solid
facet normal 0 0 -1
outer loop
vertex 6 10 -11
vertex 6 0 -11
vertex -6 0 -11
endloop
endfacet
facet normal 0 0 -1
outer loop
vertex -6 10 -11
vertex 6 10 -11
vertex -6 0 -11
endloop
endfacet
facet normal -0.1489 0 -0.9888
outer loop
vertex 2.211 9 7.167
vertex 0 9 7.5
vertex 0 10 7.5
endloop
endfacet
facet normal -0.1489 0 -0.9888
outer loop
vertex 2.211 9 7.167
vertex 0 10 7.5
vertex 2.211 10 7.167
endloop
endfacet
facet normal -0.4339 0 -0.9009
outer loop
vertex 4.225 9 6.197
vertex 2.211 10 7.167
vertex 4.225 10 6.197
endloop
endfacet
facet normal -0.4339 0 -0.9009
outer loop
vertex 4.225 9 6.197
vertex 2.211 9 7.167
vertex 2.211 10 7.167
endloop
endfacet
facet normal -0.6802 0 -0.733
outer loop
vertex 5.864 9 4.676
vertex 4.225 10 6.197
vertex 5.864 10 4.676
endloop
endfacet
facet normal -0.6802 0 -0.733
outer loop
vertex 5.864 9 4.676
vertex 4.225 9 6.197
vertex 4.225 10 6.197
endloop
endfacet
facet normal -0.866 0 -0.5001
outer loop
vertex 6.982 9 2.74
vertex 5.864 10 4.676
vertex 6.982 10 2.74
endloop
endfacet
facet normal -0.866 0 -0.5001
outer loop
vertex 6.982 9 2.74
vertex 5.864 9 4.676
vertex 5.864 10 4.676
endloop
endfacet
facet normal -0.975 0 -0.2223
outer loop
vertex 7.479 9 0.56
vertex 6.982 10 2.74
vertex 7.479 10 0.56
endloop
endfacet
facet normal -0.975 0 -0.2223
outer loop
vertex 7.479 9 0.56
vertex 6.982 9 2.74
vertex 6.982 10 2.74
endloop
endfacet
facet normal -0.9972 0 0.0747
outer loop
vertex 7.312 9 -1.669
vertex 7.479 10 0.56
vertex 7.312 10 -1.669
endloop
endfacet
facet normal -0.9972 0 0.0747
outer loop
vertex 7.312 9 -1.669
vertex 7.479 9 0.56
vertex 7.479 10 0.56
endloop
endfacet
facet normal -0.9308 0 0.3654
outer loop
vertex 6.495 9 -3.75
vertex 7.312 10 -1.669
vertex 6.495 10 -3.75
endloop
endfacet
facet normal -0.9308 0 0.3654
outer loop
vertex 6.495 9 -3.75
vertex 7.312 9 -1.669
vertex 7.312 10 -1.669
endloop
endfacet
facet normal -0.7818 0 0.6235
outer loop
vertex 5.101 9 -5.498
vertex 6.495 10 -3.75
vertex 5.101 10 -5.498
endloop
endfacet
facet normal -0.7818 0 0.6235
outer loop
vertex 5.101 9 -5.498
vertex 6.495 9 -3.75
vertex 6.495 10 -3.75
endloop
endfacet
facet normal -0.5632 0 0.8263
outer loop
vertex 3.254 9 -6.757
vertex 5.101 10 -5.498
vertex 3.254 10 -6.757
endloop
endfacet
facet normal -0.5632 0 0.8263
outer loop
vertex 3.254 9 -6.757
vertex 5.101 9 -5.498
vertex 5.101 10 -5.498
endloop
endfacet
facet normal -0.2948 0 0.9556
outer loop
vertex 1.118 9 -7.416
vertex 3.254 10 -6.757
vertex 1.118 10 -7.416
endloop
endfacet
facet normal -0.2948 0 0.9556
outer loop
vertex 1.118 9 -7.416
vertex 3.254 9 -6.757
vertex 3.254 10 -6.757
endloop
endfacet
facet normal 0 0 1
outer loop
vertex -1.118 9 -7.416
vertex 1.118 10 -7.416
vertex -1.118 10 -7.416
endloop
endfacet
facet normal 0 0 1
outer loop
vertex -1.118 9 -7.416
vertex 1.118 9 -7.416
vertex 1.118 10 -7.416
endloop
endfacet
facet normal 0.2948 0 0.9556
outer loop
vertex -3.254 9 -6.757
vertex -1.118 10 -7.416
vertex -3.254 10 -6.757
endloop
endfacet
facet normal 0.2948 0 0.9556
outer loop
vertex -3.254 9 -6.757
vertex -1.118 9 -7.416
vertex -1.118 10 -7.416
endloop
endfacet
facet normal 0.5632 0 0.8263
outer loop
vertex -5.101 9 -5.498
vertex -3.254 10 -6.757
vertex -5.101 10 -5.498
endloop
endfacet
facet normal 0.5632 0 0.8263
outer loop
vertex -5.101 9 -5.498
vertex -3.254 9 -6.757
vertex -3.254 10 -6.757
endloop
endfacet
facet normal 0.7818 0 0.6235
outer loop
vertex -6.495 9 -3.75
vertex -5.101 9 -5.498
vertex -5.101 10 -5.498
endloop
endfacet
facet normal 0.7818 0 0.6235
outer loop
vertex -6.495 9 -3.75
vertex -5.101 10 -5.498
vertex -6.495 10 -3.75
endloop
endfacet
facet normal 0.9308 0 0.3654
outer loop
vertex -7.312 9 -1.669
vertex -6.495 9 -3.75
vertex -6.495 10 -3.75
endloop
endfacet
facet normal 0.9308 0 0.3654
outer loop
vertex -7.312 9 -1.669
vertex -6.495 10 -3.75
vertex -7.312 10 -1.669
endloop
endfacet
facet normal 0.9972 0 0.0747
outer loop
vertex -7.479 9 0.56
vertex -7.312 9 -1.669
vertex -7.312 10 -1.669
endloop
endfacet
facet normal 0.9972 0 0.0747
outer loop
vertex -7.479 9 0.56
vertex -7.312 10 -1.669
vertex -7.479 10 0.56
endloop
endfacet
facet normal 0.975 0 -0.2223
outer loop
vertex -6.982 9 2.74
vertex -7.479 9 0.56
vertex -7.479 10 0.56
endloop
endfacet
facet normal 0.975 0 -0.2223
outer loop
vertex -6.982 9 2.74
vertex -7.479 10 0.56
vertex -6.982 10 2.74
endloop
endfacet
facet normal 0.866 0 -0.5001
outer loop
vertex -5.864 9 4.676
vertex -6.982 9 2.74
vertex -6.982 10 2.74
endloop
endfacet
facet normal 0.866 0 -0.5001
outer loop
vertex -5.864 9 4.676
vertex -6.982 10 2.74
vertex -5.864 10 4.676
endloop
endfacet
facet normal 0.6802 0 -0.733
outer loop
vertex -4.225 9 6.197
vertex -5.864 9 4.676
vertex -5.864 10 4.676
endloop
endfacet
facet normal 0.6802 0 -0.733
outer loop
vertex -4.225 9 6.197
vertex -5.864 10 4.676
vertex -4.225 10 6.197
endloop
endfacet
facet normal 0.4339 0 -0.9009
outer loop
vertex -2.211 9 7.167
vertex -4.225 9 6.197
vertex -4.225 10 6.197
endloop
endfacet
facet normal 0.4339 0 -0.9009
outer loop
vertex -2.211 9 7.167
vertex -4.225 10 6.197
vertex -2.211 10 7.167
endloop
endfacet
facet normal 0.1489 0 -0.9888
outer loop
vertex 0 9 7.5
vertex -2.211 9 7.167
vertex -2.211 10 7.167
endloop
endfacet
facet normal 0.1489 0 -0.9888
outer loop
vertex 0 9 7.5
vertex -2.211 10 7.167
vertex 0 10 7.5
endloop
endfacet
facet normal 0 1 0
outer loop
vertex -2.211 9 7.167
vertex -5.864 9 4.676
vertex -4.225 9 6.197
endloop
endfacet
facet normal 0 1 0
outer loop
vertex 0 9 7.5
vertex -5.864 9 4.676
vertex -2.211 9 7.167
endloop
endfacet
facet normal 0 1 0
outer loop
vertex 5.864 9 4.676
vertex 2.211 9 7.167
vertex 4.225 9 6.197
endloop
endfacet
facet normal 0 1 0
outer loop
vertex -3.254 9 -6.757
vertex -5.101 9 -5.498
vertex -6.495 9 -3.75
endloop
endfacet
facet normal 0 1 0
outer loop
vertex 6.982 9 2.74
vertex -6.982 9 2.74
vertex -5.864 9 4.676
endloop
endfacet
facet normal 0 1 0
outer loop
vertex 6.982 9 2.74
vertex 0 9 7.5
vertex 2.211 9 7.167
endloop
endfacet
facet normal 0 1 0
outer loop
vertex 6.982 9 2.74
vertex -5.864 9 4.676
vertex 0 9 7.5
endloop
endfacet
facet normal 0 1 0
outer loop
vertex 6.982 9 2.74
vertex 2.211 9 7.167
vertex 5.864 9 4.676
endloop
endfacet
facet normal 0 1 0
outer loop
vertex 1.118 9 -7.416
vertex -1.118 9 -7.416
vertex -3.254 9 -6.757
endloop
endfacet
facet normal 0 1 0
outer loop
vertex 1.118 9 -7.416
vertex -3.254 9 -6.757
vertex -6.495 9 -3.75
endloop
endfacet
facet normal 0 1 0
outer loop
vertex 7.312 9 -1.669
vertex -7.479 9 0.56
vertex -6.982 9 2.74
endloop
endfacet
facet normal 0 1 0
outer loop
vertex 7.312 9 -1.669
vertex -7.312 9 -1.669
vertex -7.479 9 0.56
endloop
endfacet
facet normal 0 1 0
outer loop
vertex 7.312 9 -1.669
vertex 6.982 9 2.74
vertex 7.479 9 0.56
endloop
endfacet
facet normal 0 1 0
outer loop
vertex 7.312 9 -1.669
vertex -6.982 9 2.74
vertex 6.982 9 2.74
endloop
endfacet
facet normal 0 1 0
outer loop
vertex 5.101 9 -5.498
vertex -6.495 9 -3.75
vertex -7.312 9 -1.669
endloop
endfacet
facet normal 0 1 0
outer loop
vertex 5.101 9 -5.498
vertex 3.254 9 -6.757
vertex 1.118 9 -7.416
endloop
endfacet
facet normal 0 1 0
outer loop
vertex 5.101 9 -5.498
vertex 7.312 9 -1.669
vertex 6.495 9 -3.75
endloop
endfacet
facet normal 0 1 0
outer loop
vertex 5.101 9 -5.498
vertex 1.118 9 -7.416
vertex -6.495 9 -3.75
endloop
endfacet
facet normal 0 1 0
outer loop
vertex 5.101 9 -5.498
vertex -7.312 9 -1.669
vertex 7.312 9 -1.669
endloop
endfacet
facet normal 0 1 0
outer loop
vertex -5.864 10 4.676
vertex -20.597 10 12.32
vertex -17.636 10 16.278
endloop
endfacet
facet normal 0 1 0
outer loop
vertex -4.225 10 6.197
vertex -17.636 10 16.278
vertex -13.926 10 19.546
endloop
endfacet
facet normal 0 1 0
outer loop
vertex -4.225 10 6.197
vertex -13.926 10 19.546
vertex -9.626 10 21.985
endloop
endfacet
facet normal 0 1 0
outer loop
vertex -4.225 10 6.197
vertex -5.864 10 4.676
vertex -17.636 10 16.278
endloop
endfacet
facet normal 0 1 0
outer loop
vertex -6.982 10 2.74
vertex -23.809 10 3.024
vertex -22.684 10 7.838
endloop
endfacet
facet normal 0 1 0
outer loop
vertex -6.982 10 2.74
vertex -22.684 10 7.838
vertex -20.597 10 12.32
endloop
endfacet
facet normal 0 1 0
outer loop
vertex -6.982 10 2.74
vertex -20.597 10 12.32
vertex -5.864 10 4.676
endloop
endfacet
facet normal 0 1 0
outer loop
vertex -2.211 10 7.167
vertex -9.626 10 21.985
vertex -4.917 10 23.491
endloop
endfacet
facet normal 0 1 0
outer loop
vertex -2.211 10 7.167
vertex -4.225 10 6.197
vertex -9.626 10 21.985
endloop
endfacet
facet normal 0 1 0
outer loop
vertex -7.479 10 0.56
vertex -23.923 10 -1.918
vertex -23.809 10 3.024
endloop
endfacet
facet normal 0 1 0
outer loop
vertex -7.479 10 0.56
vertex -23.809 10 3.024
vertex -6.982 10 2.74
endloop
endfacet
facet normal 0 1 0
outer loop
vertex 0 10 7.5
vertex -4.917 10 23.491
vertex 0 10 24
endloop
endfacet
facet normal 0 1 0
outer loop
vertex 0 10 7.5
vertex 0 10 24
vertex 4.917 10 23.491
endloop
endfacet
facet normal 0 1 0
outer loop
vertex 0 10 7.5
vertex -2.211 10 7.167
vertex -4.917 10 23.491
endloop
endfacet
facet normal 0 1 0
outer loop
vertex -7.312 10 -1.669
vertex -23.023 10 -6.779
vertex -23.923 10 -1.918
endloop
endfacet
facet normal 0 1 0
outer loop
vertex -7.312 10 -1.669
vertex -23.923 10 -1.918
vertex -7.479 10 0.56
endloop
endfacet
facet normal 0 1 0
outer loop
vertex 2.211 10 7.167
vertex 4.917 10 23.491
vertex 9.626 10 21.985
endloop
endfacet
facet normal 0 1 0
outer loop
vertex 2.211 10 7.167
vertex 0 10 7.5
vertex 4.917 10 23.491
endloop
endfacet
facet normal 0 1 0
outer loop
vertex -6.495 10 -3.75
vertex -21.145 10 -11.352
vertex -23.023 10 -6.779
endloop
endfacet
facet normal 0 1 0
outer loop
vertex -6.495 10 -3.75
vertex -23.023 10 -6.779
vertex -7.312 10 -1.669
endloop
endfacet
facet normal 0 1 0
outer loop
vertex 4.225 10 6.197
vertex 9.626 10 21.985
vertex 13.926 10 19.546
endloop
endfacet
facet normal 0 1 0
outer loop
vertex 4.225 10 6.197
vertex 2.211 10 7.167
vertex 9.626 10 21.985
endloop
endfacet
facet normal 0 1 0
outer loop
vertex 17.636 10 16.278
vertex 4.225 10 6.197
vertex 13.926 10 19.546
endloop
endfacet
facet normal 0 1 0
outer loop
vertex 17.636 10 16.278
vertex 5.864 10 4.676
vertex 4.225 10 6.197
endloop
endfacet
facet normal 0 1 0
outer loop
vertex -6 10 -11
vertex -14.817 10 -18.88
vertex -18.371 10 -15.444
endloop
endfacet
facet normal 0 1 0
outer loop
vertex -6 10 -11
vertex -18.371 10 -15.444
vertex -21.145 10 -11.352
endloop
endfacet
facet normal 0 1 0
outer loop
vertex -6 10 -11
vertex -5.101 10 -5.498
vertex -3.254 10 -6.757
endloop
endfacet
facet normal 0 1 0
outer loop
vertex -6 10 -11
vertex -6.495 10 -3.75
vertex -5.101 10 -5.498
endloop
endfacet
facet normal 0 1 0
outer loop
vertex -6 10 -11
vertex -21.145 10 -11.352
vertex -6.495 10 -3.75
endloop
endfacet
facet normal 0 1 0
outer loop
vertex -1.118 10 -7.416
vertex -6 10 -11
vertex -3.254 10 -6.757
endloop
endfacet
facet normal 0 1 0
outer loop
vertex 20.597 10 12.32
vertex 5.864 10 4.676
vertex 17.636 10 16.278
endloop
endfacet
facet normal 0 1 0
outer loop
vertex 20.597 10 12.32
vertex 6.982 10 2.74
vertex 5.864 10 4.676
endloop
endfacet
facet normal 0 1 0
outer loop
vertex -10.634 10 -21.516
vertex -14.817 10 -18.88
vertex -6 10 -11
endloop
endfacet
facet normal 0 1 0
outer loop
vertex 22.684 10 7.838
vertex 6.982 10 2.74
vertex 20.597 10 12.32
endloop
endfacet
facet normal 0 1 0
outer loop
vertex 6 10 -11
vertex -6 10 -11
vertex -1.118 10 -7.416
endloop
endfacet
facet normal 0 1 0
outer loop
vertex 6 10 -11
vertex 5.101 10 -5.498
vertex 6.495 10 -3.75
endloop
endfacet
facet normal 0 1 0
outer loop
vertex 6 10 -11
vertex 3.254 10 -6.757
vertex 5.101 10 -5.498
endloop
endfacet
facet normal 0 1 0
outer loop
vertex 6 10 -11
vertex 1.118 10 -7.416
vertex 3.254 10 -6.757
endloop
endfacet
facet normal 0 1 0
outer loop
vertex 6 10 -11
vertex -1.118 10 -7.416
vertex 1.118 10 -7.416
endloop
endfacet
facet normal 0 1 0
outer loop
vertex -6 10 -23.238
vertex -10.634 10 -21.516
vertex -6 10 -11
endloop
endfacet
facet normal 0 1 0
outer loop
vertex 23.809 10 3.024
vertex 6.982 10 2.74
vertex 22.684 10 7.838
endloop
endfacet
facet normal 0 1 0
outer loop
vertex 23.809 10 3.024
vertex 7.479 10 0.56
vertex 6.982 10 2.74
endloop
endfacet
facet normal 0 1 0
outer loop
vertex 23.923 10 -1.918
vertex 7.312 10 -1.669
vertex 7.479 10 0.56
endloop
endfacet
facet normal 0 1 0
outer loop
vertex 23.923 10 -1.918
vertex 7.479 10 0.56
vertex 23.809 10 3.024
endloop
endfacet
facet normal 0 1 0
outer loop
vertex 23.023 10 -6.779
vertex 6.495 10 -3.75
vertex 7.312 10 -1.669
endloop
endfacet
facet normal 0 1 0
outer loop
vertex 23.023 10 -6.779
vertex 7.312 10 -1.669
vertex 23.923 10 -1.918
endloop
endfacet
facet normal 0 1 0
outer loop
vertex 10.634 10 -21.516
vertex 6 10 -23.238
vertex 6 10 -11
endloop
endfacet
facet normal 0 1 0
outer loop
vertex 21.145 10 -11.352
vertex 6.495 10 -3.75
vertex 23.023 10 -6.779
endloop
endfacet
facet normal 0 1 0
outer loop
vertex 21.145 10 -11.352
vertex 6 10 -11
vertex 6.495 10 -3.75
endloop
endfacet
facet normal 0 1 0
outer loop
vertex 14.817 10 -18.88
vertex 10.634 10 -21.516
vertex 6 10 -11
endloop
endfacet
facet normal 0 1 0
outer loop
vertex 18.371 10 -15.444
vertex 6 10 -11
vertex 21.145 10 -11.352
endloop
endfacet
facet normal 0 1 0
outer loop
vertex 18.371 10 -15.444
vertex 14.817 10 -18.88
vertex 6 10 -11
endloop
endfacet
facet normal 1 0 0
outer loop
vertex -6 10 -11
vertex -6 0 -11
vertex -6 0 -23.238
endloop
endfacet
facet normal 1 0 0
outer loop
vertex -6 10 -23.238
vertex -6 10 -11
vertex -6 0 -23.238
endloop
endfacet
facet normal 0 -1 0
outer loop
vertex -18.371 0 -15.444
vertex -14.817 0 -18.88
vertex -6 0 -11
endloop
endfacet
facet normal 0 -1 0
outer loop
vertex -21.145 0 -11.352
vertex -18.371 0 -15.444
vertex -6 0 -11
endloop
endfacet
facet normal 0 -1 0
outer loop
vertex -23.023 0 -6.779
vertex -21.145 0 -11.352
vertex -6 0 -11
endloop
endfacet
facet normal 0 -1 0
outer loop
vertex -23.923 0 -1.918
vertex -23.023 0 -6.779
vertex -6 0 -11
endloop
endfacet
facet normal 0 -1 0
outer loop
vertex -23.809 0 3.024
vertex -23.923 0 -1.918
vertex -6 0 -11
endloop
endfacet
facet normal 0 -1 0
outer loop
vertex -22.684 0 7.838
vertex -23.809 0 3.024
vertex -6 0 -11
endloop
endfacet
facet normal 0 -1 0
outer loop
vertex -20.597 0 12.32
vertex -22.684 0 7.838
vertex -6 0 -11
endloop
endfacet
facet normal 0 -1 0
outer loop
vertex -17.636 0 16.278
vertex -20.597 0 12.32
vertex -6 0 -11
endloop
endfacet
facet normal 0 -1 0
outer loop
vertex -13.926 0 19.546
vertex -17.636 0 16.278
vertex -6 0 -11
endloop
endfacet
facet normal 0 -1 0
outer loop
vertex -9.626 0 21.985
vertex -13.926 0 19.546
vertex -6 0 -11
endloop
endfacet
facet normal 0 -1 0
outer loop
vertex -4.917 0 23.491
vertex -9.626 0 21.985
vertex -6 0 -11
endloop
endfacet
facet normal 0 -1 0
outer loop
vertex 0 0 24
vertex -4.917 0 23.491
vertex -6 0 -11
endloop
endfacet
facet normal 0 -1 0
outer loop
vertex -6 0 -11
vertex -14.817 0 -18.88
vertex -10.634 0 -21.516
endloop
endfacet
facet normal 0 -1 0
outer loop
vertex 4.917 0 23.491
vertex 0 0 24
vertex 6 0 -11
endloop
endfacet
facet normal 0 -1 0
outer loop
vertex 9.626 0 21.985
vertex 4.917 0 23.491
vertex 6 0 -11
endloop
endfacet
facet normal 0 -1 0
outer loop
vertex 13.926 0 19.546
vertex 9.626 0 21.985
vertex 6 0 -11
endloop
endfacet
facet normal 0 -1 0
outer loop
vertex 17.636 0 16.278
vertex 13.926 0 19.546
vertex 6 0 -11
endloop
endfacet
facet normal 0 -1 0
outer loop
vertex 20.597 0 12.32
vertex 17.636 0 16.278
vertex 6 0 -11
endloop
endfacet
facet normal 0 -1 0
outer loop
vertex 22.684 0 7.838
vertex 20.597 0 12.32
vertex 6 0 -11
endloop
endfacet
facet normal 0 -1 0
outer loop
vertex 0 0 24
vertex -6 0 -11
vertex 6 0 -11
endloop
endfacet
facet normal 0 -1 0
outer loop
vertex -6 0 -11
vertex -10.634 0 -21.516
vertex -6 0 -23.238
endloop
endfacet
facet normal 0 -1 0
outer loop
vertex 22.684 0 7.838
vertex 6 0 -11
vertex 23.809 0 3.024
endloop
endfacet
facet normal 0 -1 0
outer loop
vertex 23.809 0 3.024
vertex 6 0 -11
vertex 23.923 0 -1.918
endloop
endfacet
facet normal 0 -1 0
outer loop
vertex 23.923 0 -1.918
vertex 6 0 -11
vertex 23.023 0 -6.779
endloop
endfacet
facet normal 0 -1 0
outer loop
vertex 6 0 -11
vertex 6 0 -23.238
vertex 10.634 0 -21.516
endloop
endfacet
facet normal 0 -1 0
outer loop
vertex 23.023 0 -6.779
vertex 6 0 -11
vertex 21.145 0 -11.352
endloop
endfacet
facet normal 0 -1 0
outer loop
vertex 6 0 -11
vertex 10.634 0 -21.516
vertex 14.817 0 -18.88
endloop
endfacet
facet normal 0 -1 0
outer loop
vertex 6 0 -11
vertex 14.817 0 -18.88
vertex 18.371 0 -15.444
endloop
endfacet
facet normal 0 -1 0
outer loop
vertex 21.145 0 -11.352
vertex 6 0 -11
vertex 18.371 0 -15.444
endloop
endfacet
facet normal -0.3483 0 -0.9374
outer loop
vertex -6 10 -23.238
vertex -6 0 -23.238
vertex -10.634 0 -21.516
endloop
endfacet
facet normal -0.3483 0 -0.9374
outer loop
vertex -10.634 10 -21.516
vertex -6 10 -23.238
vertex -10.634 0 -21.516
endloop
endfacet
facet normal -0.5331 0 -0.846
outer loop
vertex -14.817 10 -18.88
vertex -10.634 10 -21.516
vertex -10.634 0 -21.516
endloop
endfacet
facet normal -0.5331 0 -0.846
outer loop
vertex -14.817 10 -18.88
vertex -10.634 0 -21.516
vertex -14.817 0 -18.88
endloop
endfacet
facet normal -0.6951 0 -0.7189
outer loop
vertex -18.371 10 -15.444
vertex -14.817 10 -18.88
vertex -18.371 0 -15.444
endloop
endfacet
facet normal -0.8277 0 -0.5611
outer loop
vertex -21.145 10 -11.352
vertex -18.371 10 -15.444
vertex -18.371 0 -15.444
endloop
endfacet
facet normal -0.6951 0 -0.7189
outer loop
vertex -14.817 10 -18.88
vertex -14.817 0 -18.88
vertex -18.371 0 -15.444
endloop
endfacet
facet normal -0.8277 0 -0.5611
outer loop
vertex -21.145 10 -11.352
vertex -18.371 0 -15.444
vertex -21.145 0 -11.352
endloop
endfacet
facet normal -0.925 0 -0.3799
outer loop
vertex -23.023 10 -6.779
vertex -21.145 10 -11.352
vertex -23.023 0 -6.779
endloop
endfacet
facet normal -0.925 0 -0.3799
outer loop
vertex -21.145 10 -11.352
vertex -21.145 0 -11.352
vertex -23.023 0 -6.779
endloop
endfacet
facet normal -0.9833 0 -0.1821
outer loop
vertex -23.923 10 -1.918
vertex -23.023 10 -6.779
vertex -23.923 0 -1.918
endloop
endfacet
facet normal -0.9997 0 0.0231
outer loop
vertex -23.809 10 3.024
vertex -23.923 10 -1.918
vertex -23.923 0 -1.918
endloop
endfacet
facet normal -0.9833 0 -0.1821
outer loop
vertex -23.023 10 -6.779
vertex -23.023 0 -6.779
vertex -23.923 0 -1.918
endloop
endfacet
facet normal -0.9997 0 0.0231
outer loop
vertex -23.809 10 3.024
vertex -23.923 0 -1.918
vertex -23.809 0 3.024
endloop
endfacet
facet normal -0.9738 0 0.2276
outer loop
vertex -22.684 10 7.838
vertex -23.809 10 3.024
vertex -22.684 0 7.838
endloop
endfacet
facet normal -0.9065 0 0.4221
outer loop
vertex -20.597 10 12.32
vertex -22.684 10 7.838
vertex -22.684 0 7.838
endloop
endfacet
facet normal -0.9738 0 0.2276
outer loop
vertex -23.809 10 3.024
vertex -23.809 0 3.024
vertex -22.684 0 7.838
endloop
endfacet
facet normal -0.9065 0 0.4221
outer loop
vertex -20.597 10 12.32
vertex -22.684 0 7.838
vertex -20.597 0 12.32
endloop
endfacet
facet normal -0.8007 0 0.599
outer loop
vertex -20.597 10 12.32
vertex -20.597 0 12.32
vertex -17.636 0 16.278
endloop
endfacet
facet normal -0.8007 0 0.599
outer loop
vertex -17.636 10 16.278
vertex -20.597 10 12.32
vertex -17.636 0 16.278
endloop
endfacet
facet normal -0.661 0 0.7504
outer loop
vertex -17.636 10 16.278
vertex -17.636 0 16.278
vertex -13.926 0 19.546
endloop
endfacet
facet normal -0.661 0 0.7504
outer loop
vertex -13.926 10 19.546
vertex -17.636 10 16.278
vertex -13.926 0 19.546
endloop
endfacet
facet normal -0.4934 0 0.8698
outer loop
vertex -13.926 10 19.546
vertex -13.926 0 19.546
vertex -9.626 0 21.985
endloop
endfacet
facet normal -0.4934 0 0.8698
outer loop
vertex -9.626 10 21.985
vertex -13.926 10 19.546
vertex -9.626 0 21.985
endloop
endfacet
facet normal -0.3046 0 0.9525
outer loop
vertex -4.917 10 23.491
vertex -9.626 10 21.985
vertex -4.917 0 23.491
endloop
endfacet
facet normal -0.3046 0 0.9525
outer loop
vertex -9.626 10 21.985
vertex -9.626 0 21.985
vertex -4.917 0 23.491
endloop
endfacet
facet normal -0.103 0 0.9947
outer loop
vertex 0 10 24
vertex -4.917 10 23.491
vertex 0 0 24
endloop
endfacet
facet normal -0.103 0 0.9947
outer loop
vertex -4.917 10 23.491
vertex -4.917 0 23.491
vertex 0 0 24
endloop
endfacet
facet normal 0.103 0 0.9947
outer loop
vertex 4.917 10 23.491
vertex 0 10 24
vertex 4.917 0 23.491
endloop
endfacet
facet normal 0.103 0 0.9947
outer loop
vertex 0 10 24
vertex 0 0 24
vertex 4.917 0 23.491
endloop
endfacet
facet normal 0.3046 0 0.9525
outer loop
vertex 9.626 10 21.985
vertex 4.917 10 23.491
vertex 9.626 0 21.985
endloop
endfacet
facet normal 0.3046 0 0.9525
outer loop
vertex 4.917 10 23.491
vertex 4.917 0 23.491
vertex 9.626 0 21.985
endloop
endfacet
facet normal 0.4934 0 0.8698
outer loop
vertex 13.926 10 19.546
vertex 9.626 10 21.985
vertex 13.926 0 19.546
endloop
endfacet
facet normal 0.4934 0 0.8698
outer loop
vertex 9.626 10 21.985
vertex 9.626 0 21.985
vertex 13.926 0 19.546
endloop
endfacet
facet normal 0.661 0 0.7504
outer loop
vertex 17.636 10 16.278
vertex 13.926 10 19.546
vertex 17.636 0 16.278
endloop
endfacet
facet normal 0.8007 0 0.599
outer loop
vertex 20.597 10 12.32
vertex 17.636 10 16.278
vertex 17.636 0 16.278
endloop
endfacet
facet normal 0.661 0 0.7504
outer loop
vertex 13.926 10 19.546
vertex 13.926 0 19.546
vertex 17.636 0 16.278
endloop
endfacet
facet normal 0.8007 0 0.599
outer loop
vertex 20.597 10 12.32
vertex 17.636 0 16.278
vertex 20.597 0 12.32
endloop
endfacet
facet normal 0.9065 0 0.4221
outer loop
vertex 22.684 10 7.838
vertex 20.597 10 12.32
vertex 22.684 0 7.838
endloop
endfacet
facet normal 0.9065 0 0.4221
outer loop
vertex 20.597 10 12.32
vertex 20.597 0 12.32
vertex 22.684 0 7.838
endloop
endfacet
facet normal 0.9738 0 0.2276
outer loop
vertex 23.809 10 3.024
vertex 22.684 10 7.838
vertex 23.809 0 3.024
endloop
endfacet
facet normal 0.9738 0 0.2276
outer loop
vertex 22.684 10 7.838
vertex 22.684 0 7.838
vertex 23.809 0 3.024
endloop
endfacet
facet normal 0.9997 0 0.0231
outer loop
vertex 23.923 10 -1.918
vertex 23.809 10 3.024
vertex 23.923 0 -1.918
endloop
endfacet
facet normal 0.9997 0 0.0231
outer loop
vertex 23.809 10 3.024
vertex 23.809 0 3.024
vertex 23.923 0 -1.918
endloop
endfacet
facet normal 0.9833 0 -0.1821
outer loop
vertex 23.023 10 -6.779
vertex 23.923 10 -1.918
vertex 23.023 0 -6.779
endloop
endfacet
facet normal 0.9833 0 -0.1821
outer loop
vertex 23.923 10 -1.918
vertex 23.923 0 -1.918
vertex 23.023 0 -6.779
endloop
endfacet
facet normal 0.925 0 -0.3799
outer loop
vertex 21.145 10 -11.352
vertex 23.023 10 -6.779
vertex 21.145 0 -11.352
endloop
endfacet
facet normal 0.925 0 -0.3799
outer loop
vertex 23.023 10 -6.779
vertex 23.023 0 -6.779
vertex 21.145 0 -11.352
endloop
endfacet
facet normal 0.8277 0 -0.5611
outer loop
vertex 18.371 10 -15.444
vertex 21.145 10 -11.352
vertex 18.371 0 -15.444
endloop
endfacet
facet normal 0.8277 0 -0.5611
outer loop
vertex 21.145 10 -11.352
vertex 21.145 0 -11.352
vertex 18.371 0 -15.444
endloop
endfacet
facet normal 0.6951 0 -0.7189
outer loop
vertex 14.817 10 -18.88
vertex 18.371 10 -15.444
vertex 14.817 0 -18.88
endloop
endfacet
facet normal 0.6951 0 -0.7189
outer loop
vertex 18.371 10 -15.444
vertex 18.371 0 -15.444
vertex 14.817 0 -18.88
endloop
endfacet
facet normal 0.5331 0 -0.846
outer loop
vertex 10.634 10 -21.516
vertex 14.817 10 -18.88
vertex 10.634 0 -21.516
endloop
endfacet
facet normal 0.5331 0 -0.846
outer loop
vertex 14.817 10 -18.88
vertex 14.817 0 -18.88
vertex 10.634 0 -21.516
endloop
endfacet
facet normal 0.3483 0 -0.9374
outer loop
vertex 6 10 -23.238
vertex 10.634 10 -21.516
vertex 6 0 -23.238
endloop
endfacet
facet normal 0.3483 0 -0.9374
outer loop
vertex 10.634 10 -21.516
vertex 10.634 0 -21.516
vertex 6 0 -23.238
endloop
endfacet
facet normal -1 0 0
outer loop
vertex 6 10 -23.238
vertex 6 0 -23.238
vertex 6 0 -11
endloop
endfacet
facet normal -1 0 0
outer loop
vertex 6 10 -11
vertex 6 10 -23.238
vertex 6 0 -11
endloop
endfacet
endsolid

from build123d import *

# Parameters (mm, degrees)
BOSS_EXTRUDE1_DEPTH = 10
BOSS_EXTRUDE2_DEPTH = 9


with BuildPart() as part:
    # Sketch1 → Boss-Extrude1 (new body)
    with BuildSketch(Plane(origin=(0, 0, 0), x_dir=(1, 0, 0), z_dir=(0, 1, 0))):
        with BuildLine():
            Line((-6, 11), (-6, 23))
            Line((-6, 23), (-6, 23.237900077))
            ThreePointArc((-6, 23.237900077), (-23.80871271, -3.02410302), (0, -24))
            ThreePointArc((0, -24), (23.80871271, -3.02410302), (6, 23.237900077))
            Line((6, 23.237900077), (6, 23))
            Line((6, 23), (6, 11))
            Line((6, 11), (-6, 11))
        make_face()
        with BuildLine():
            ThreePointArc((7.5, 0), (5.303300859, -5.303300859), (0, -7.5))
            ThreePointArc((0, -7.5), (-5.303300859, 5.303300859), (7.5, 0))
        make_face(mode=Mode.SUBTRACT)
    extrude(amount=BOSS_EXTRUDE1_DEPTH)

    # Sketch1<3> → Boss-Extrude2 (add)
    with BuildSketch(Plane(origin=(0, 0, 0), x_dir=(1, 0, 0), z_dir=(0, 1, 0))):
        with BuildLine():
            ThreePointArc((7.5, 0), (-5.303300859, 5.303300859), (0, -7.5))
            ThreePointArc((0, -7.5), (5.303300859, -5.303300859), (7.5, 0))
        make_face()
    extrude(amount=BOSS_EXTRUDE2_DEPTH)


solid = part.part
